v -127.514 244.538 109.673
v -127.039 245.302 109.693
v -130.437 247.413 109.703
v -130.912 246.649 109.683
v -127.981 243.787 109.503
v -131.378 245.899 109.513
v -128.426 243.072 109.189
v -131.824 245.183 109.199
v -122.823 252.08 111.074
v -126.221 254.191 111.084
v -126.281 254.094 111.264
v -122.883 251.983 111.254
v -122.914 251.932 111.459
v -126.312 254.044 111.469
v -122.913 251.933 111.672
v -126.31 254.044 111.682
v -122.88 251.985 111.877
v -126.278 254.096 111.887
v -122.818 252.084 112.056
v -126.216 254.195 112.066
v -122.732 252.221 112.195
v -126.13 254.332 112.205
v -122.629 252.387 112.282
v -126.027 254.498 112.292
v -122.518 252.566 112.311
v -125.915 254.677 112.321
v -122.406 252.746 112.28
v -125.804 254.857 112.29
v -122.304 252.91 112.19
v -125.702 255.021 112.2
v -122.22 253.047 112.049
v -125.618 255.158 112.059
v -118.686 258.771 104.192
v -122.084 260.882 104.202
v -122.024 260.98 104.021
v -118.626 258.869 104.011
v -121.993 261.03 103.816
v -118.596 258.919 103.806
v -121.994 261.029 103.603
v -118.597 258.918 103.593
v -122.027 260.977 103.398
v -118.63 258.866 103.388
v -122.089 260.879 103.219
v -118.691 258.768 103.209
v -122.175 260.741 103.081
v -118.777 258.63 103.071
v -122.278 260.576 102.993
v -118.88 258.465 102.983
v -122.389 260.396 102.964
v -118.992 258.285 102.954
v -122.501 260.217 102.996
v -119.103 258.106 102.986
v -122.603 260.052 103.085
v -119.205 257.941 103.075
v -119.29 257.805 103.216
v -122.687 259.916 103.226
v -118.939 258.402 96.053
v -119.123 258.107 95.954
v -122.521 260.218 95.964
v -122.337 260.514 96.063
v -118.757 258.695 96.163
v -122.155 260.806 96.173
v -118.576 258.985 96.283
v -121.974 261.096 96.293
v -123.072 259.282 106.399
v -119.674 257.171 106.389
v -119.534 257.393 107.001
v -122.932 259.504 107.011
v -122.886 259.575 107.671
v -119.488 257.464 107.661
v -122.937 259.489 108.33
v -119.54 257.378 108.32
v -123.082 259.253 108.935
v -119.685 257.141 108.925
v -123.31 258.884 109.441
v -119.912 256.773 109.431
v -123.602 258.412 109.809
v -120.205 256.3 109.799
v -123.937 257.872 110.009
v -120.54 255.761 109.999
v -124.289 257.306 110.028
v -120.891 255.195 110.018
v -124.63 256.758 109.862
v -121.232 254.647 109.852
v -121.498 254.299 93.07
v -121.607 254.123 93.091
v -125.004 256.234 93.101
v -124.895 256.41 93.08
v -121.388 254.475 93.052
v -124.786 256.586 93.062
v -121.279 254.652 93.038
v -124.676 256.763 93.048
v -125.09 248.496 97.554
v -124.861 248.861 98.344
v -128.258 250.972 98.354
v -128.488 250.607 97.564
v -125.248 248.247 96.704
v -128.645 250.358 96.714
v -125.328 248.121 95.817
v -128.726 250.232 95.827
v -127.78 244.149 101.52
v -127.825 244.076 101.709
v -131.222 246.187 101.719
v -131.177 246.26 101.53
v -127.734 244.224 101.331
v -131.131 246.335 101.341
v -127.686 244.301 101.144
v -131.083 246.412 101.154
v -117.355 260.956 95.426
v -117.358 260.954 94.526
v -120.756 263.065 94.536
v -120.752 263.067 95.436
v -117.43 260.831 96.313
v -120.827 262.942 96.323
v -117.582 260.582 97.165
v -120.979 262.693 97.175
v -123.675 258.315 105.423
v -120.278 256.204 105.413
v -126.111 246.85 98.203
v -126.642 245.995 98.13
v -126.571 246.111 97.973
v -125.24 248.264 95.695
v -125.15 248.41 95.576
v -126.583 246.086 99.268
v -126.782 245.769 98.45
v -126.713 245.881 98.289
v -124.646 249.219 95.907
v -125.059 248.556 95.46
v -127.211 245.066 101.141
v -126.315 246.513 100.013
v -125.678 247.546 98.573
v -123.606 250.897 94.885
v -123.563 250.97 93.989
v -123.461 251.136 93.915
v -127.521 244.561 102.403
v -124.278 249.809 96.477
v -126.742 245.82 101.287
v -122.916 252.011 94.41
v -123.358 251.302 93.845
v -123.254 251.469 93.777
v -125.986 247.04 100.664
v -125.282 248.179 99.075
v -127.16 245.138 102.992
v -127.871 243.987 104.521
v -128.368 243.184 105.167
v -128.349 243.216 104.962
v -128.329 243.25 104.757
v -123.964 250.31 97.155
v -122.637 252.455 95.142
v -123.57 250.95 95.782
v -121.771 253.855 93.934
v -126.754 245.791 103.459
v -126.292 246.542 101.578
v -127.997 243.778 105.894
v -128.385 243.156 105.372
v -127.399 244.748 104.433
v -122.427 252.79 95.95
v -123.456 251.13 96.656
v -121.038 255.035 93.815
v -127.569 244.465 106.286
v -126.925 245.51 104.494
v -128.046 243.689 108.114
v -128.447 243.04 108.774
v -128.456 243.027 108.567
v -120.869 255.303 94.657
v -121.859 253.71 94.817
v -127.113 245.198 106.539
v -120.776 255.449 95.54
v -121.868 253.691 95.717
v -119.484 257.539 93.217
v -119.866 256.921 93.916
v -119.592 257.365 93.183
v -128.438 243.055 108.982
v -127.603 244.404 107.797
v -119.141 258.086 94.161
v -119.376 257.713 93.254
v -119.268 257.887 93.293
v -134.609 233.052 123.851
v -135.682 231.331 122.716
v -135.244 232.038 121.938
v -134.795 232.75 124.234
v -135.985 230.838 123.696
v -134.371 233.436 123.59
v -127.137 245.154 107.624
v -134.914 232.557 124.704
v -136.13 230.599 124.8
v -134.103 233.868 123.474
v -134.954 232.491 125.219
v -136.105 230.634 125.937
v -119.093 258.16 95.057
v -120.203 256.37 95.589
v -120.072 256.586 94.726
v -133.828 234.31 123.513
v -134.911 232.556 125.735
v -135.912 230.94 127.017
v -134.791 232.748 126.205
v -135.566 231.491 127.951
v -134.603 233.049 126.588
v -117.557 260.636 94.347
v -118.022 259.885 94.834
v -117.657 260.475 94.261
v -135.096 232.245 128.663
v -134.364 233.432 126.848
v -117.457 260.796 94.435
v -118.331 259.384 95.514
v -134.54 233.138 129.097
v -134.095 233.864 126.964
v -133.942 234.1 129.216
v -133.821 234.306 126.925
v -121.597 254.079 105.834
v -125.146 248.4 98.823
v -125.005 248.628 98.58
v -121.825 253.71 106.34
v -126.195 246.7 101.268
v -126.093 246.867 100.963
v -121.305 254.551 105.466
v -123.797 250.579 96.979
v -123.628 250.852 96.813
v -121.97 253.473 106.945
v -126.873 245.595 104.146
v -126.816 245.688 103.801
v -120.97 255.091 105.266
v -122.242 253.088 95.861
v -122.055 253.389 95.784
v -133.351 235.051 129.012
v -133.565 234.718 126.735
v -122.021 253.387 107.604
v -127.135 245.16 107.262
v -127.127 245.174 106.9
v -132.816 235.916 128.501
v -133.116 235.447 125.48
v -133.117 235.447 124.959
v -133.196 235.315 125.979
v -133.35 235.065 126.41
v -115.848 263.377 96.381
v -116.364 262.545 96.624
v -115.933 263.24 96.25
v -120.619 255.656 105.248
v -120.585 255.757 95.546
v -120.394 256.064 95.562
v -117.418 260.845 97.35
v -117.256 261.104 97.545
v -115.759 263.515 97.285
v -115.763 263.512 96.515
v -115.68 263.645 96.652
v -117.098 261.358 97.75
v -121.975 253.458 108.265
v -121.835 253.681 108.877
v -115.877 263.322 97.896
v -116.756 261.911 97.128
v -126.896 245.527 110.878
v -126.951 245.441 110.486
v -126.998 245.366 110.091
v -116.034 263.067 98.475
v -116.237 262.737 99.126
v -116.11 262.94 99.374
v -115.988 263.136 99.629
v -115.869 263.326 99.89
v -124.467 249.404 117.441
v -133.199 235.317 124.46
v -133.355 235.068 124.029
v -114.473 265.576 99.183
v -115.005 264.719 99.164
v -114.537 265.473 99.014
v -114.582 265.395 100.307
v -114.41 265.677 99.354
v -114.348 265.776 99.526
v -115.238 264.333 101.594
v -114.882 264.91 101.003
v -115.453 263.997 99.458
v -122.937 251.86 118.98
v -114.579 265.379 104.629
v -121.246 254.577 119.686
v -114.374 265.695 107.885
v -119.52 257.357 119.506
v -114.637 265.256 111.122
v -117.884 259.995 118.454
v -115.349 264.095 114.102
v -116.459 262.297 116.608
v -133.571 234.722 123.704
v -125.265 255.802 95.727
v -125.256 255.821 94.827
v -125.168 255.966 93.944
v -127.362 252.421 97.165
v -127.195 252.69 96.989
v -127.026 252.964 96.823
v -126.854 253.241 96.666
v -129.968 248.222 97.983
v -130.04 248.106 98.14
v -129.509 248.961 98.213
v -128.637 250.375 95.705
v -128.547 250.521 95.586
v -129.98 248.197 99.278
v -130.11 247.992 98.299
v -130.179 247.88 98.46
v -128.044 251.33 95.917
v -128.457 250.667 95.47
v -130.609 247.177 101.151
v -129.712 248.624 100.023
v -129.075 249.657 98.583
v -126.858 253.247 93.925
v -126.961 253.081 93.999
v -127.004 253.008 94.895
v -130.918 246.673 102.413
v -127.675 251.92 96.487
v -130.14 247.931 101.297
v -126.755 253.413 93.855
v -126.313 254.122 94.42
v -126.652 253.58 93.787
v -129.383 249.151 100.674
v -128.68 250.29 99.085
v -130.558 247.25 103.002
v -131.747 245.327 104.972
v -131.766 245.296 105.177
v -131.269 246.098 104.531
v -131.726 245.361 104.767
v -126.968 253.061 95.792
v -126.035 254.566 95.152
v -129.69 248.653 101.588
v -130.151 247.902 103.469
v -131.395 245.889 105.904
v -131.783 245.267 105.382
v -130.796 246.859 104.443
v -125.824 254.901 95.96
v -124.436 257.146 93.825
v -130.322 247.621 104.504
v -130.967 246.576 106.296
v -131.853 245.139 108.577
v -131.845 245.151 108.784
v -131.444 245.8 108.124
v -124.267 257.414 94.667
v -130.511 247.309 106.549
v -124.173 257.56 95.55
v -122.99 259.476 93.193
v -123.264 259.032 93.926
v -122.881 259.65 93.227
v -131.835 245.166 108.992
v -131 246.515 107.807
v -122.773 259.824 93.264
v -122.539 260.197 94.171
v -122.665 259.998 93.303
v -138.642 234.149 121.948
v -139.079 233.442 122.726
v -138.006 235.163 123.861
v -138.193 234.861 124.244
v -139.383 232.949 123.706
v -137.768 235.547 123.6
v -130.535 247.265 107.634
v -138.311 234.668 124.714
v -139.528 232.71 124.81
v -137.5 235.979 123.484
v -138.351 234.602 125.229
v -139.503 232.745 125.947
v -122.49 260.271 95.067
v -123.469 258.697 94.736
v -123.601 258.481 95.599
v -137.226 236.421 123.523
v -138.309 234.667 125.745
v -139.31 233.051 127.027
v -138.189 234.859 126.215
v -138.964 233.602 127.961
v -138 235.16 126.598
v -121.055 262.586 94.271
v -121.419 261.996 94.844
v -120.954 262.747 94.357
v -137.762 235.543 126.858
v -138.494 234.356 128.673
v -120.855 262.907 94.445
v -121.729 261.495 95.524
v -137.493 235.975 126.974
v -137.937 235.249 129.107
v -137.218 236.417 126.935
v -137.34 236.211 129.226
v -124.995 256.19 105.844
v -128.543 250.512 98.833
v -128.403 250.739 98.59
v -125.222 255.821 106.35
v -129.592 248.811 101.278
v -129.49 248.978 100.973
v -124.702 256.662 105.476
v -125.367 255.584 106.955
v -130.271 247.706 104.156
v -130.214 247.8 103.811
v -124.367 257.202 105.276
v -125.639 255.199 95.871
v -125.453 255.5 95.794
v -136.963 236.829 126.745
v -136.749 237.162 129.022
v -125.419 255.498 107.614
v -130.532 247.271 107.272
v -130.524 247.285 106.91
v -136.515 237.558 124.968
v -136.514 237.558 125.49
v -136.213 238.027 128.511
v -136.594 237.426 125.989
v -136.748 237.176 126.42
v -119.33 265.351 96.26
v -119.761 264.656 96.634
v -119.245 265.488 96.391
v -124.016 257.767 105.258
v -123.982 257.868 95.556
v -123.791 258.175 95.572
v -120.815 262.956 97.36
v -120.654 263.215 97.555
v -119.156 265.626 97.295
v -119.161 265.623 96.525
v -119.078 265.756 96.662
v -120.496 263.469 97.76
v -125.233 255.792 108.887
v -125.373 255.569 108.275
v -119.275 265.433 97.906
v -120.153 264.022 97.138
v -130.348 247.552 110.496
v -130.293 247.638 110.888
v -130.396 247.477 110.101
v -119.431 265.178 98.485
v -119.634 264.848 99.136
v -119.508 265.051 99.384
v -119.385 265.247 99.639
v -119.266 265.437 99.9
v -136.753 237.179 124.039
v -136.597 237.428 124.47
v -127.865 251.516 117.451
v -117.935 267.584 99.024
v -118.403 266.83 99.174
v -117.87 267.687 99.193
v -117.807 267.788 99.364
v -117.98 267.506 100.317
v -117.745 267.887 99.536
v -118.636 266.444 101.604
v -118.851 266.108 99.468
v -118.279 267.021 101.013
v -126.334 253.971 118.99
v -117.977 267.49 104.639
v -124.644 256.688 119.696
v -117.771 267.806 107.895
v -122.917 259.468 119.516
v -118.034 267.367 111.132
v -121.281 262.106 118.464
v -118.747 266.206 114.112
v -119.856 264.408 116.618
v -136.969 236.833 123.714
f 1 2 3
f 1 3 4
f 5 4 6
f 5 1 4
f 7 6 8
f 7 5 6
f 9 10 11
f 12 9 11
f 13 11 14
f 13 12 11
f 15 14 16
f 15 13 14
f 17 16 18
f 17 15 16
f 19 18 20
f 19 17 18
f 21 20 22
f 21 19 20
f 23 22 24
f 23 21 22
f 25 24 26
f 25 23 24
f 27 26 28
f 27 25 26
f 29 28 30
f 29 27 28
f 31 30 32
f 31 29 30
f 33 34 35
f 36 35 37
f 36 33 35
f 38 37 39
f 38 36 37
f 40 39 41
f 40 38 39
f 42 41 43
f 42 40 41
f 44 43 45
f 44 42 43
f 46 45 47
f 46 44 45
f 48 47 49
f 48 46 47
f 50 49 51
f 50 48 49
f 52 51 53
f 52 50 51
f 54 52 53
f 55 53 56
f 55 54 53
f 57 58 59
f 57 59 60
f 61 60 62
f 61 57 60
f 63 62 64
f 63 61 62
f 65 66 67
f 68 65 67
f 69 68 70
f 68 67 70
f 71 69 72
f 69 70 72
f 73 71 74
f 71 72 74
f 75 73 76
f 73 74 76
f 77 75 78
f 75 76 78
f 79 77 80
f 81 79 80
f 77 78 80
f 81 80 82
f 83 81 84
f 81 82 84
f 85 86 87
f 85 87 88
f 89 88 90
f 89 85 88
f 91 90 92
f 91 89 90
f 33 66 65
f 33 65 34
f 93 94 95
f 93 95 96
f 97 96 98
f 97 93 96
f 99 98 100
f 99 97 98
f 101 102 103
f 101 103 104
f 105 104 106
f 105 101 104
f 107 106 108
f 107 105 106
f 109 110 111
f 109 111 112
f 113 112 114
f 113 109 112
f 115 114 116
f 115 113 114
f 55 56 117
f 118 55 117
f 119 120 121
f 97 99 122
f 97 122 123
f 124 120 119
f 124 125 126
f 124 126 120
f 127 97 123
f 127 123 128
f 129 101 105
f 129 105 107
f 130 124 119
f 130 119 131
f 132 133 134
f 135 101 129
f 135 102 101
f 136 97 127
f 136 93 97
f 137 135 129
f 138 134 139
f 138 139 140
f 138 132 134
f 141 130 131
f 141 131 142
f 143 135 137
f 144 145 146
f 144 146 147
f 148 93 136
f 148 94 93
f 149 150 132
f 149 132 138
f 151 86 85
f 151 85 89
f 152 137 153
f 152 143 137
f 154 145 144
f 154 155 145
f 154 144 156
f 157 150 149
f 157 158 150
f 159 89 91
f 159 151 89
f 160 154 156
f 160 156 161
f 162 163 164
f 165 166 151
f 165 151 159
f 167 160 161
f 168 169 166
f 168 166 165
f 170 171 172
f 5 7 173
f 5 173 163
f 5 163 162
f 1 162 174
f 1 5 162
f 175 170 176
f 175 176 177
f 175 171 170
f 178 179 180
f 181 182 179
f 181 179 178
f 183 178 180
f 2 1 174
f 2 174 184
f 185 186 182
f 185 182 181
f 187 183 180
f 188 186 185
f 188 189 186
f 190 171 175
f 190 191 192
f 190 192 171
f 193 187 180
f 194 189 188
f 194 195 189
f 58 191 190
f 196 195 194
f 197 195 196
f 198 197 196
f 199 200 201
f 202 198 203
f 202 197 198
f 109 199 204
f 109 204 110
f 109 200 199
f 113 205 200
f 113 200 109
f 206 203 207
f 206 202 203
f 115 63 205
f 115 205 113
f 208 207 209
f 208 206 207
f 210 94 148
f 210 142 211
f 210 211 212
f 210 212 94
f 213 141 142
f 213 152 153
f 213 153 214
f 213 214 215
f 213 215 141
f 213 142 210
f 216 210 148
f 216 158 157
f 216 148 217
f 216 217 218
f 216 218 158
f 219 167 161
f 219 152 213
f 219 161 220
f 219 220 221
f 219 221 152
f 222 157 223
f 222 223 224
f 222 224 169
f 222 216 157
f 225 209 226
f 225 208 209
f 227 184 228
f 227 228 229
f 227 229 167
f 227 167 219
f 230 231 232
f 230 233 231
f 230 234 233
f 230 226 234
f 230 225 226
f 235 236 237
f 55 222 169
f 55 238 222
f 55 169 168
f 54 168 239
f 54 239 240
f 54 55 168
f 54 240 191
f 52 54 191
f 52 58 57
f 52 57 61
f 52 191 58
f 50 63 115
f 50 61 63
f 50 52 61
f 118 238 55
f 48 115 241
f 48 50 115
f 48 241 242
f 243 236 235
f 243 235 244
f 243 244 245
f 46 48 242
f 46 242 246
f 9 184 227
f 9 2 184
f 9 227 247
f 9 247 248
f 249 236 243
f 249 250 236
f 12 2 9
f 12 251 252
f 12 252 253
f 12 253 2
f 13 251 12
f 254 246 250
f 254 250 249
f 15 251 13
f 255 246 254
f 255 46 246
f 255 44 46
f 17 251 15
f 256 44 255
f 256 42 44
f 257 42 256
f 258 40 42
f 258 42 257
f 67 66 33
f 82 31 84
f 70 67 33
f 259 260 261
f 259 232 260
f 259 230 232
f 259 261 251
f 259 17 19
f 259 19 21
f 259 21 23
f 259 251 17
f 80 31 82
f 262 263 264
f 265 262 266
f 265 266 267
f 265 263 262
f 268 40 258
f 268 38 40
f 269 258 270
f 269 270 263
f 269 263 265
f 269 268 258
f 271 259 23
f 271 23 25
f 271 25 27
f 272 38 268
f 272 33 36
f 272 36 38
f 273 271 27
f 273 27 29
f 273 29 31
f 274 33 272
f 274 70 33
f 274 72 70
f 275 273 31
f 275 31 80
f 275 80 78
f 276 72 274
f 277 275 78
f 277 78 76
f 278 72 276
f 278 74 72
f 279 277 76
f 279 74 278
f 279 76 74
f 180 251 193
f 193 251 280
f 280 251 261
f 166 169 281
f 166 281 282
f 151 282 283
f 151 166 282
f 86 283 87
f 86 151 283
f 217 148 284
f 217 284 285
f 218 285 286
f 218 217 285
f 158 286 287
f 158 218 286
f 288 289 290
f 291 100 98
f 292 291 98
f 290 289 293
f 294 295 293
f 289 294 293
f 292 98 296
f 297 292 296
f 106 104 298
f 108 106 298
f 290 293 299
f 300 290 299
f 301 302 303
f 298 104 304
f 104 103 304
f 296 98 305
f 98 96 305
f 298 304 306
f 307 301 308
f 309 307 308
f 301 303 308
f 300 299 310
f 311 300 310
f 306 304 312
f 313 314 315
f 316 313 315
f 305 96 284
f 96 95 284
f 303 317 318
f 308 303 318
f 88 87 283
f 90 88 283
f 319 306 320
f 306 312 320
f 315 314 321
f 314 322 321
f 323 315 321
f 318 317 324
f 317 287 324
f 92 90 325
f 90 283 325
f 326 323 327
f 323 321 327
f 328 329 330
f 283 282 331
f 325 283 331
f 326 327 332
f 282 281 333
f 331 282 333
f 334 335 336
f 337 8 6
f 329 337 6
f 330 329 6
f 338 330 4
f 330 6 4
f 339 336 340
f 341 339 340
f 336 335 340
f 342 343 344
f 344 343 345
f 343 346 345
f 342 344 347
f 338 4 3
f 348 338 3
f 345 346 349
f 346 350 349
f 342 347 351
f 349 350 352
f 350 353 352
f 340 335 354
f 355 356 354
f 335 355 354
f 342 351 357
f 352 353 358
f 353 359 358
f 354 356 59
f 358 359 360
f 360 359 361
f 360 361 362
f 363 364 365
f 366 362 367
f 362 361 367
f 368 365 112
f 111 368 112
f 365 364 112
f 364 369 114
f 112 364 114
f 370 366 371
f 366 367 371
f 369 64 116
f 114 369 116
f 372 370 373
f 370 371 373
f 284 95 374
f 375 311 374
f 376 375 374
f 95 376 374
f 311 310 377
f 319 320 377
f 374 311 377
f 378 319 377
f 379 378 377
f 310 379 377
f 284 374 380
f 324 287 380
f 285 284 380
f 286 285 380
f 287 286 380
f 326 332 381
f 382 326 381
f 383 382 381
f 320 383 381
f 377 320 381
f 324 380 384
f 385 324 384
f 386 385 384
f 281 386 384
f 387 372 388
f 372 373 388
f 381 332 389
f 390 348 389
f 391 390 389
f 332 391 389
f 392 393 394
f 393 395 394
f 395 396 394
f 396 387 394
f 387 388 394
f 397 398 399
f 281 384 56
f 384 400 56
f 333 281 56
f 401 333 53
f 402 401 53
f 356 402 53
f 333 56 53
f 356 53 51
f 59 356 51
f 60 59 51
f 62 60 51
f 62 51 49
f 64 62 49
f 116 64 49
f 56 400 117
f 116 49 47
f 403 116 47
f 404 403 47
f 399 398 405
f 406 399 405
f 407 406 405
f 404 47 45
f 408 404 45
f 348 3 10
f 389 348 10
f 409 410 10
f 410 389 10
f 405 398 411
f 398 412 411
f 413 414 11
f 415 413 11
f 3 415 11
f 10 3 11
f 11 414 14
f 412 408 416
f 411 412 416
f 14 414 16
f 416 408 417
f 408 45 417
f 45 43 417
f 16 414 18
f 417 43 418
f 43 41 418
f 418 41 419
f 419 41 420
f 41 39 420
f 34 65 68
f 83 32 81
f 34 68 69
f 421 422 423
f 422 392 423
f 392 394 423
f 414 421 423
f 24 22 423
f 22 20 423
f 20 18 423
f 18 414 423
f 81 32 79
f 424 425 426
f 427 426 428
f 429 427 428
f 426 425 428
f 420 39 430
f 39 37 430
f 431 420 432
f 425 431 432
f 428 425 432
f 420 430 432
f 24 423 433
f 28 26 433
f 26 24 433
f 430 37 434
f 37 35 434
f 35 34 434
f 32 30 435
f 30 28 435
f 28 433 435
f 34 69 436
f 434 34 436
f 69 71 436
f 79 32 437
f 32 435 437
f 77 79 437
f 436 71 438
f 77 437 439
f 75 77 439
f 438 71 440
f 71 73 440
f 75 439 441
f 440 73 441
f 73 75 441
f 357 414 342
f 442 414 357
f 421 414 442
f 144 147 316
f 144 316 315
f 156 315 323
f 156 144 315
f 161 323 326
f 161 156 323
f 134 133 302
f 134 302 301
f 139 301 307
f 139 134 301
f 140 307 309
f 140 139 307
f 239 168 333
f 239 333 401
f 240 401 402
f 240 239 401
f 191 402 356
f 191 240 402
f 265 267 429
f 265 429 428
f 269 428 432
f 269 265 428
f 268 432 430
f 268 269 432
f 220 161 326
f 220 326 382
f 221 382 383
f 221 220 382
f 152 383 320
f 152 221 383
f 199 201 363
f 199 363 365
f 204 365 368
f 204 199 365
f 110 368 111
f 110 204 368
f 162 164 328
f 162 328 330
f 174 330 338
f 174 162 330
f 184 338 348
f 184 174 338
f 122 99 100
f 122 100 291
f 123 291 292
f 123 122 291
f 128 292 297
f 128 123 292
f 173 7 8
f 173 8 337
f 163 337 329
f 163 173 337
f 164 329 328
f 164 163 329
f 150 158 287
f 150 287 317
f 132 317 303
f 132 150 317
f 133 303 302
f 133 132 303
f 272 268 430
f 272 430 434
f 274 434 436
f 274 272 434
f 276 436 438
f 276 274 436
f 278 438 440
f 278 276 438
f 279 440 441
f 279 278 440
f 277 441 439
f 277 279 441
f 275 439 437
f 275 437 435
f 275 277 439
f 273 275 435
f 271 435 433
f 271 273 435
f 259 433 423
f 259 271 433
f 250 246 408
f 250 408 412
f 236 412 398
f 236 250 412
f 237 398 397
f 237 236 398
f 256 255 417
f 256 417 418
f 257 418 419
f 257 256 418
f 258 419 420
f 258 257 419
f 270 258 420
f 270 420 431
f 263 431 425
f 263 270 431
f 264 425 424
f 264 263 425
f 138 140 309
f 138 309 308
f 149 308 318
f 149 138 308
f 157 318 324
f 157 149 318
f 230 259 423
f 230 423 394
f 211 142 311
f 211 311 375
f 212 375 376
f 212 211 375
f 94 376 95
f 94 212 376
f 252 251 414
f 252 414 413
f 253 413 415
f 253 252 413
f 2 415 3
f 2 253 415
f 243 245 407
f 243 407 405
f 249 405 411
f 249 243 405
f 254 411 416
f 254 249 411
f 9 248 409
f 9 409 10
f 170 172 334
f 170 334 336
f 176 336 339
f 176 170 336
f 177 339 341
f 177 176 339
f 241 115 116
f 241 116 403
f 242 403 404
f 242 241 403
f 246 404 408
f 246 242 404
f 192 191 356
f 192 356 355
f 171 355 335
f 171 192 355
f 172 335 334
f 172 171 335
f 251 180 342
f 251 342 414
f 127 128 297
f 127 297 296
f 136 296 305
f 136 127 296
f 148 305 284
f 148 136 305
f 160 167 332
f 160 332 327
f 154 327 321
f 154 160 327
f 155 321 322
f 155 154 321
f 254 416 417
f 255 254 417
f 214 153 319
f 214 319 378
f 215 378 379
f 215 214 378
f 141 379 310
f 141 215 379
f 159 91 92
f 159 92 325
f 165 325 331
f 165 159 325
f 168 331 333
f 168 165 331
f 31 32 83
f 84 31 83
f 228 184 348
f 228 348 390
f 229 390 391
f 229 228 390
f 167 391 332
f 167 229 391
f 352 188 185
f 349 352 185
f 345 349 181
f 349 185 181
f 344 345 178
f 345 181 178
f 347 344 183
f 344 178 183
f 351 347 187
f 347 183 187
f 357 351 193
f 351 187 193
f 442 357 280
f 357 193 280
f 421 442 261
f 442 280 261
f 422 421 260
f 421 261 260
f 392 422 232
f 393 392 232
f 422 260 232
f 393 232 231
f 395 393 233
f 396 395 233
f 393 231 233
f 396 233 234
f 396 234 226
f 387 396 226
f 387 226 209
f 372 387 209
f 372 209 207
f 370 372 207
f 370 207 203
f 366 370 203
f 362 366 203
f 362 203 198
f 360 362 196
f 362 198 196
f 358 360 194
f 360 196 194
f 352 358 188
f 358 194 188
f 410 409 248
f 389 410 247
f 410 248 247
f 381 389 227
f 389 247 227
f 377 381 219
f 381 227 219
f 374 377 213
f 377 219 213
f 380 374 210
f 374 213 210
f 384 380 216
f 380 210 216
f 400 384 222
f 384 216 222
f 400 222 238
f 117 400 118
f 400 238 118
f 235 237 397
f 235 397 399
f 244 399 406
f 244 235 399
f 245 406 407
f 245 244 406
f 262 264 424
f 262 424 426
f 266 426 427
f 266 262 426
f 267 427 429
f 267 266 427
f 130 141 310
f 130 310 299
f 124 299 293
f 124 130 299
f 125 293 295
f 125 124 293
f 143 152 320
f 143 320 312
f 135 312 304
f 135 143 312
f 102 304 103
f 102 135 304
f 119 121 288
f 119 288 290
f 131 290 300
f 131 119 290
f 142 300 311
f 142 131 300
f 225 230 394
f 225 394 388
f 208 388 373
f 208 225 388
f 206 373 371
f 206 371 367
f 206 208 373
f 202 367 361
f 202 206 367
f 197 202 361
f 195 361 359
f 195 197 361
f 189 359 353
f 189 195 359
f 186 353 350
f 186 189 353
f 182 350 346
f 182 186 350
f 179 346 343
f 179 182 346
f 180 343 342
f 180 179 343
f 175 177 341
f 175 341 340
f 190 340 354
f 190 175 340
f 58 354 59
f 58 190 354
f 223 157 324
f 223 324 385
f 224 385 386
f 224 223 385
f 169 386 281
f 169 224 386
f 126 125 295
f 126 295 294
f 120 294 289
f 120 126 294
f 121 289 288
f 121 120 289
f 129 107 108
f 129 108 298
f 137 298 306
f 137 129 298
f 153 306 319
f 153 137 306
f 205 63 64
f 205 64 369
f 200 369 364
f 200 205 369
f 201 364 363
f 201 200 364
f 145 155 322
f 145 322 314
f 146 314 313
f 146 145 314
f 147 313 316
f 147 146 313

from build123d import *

# Parameters (mm, degrees)
SKETCH1_R           = 1.75
SKETCH1_R_2         = 2.4
BOSS_EXTRUDE1_DEPTH = 4
CUT_EXTRUDE1_DEPTH  = 10


with BuildPart() as part:
    # Sketch1 → Boss-Extrude1 (new body)
    with BuildSketch(Plane(origin=(-201.849311144, 125.418002604, 0.593848714), x_dir=(0.5277644625295516, 0.8493907652493602, 0), z_dir=(0.8493881131629323, -0.5277628146696672, -0.002498933665448049))):
        with BuildLine():
            Line((162.208427101, 97.881301323), (161.820912094, 98.53237983))
            ThreePointArc((161.820912094, 98.53237983), (162.176155218, 98.906966779), (162.515086857, 99.296374539))
            ThreePointArc((162.515086857, 99.296374539), (163.723385062, 98.699566989), (165.041833408, 98.420536953))
            ThreePointArc((165.041833408, 98.420536953), (165.22305653, 98.674638573), (165.398816038, 98.932549505))
            ThreePointArc((165.398816038, 98.932549505), (164.681084034, 100.073174148), (163.703268012, 101.000557365))
            ThreePointArc((163.703268012, 101.000557365), (161.330105787, 116.014599459), (146.152484133, 116.847161686))
            Line((146.152484133, 116.847161686), (130.289477893, 127.907081314))
            ThreePointArc((130.289477893, 127.907081314), (124.720550757, 126.913577135), (125.714054936, 121.344649999))
            Line((125.714054936, 121.344649999), (141.577061176, 110.284730371))
            ThreePointArc((141.577061176, 110.284730371), (141.428783224, 109.695705854), (141.310268829, 109.099978927))
            ThreePointArc((141.310268829, 109.099978927), (139.965448113, 109.012680325), (138.684123333, 108.595103251))
            ThreePointArc((138.684123333, 108.595103251), (138.654230316, 108.284433232), (138.630973584, 107.973196059))
            ThreePointArc((138.630973584, 107.973196059), (139.822860053, 107.344252144), (141.133365177, 107.03002273))
            ThreePointArc((141.133365177, 107.03002273), (141.145956651, 106.487309655), (141.182892388, 105.945708529))
            ThreePointArc((141.182892388, 105.945708529), (139.906489868, 105.513319341), (138.776902071, 104.778339605))
            ThreePointArc((138.776902071, 104.778339605), (138.828434951, 104.470518528), (138.88652478, 104.163867219))
            ThreePointArc((138.88652478, 104.163867219), (140.200581367, 103.864836966), (141.547760668, 103.900498345))
            ThreePointArc((141.547760668, 103.900498345), (141.700387578, 103.379536682), (141.876241447, 102.86594984))
            ThreePointArc((141.876241447, 102.86594984), (140.755241845, 102.117936675), (139.854370572, 101.115641931))
            ThreePointArc((139.854370572, 101.115641931), (139.983817469, 100.831647293), (140.119295134, 100.550479629))
            ThreePointArc((140.119295134, 100.550479629), (141.465971053, 100.601741456), (142.758016489, 100.984863363))
            ThreePointArc((142.758016489, 100.984863363), (143.040277563, 100.521155789), (143.343065412, 100.070583325))
            ThreePointArc((143.343065412, 100.070583325), (142.453862998, 99.057922043), (141.843101138, 97.856617022))
            ThreePointArc((141.843101138, 97.856617022), (142.04164046, 97.61580259), (142.245273383, 97.379279681))
            ThreePointArc((142.245273383, 97.379279681), (143.532794895, 97.777340179), (144.681655704, 98.481813489))
            ThreePointArc((144.681655704, 98.481813489), (145.074315316, 98.10696091), (145.483402655, 97.750108592))
            ThreePointArc((145.483402655, 97.750108592), (144.886595105, 96.541810387), (144.607565069, 95.22336204))
            ThreePointArc((144.607565069, 95.22336204), (144.861666689, 95.042138918), (145.119577621, 94.866379411))
            ThreePointArc((145.119577621, 94.866379411), (146.260202264, 95.584111414), (147.18758548, 96.561927437))
            ThreePointArc((147.18758548, 96.561927437), (147.663884528, 96.301475435), (148.15139273, 96.062662159))
            ThreePointArc((148.15139273, 96.062662159), (147.887651491, 94.741070557), (147.959368715, 93.395328961))
            ThreePointArc((147.959368715, 93.395328961), (148.251716028, 93.286047206), (148.546328766, 93.183028819))
            ThreePointArc((148.546328766, 93.183028819), (149.462324855, 94.171520079), (150.105030845, 95.356042267))
            ThreePointArc((150.105030845, 95.356042267), (150.632510335, 95.227740216), (151.165216521, 95.123240713))
            ThreePointArc((151.165216521, 95.123240713), (151.252515124, 93.778419997), (151.670092198, 92.497095217))
            ThreePointArc((151.670092198, 92.497095217), (151.980762217, 92.4672022), (152.29199939, 92.443945468))
            ThreePointArc((152.29199939, 92.443945468), (152.920943305, 93.635831937), (153.235172718, 94.946337061))
            ThreePointArc((153.235172718, 94.946337061), (153.777885794, 94.958928535), (154.319486919, 94.995864272))
            ThreePointArc((154.319486919, 94.995864272), (154.751876108, 93.719461752), (155.486855844, 92.589873955))
            ThreePointArc((155.486855844, 92.589873955), (155.794676921, 92.641406835), (156.10132823, 92.699496665))
            ThreePointArc((156.10132823, 92.699496665), (156.400358482, 94.013553251), (156.364697104, 95.360732552))
            ThreePointArc((156.364697104, 95.360732552), (156.885658766, 95.513359462), (157.399245608, 95.689213331))
            ThreePointArc((157.399245608, 95.689213331), (158.147258774, 94.568213729), (159.149553518, 93.667342456))
            ThreePointArc((159.149553518, 93.667342456), (159.433548155, 93.796789353), (159.71471582, 93.932267018))
            ThreePointArc((159.71471582, 93.932267018), (159.663453993, 95.278942937), (159.280332086, 96.570988373))
            ThreePointArc((159.280332086, 96.570988373), (159.744039659, 96.853249447), (160.194612124, 97.156037296))
            ThreePointArc((160.194612124, 97.156037296), (161.207273405, 96.266834883), (162.408578427, 95.656073022))
            ThreePointArc((162.408578427, 95.656073022), (162.649392859, 95.854612345), (162.885915768, 96.058245267))
            ThreePointArc((162.885915768, 96.058245267), (162.629922136, 97.000525318), (162.208427101, 97.881301323))
        make_face()
        with Locations(Location((128.001766415, 124.625865657, 0), (0, 0, 180))):
            Circle(SKETCH1_R, mode=Mode.SUBTRACT)
        with Locations(Location((153.226111782, 107.039083666, 0), (0, 0, 180))):
            Circle(SKETCH1_R_2, mode=Mode.SUBTRACT)
    extrude(amount=-BOSS_EXTRUDE1_DEPTH)

    # Sketch3 → Cut-Extrude1 (cut)
    with BuildSketch(Plane(origin=(-201.849311144, 125.418002604, 0.593848714), x_dir=(-0.0021225711784023066, 0.0013188483828421916, -0.9999968776603934), z_dir=(0.8493881131629325, -0.527762814669667, -0.002498933665448049))):
        with BuildLine():
            Line((-111.455565577, 150.432166351), (-103.598152949, 157.159486839))
            ThreePointArc((-103.598152949, 157.159486839), (-102.54066254, 157.077547623), (-102.622601756, 156.020057214))
            Line((-102.622601756, 156.020057214), (-110.480014384, 149.292736726))
            ThreePointArc((-110.480014384, 149.292736726), (-111.537504793, 149.374675942), (-111.455565577, 150.432166351))
        make_face()
    extrude(amount=-CUT_EXTRUDE1_DEPTH, mode=Mode.SUBTRACT)


solid = part.part
